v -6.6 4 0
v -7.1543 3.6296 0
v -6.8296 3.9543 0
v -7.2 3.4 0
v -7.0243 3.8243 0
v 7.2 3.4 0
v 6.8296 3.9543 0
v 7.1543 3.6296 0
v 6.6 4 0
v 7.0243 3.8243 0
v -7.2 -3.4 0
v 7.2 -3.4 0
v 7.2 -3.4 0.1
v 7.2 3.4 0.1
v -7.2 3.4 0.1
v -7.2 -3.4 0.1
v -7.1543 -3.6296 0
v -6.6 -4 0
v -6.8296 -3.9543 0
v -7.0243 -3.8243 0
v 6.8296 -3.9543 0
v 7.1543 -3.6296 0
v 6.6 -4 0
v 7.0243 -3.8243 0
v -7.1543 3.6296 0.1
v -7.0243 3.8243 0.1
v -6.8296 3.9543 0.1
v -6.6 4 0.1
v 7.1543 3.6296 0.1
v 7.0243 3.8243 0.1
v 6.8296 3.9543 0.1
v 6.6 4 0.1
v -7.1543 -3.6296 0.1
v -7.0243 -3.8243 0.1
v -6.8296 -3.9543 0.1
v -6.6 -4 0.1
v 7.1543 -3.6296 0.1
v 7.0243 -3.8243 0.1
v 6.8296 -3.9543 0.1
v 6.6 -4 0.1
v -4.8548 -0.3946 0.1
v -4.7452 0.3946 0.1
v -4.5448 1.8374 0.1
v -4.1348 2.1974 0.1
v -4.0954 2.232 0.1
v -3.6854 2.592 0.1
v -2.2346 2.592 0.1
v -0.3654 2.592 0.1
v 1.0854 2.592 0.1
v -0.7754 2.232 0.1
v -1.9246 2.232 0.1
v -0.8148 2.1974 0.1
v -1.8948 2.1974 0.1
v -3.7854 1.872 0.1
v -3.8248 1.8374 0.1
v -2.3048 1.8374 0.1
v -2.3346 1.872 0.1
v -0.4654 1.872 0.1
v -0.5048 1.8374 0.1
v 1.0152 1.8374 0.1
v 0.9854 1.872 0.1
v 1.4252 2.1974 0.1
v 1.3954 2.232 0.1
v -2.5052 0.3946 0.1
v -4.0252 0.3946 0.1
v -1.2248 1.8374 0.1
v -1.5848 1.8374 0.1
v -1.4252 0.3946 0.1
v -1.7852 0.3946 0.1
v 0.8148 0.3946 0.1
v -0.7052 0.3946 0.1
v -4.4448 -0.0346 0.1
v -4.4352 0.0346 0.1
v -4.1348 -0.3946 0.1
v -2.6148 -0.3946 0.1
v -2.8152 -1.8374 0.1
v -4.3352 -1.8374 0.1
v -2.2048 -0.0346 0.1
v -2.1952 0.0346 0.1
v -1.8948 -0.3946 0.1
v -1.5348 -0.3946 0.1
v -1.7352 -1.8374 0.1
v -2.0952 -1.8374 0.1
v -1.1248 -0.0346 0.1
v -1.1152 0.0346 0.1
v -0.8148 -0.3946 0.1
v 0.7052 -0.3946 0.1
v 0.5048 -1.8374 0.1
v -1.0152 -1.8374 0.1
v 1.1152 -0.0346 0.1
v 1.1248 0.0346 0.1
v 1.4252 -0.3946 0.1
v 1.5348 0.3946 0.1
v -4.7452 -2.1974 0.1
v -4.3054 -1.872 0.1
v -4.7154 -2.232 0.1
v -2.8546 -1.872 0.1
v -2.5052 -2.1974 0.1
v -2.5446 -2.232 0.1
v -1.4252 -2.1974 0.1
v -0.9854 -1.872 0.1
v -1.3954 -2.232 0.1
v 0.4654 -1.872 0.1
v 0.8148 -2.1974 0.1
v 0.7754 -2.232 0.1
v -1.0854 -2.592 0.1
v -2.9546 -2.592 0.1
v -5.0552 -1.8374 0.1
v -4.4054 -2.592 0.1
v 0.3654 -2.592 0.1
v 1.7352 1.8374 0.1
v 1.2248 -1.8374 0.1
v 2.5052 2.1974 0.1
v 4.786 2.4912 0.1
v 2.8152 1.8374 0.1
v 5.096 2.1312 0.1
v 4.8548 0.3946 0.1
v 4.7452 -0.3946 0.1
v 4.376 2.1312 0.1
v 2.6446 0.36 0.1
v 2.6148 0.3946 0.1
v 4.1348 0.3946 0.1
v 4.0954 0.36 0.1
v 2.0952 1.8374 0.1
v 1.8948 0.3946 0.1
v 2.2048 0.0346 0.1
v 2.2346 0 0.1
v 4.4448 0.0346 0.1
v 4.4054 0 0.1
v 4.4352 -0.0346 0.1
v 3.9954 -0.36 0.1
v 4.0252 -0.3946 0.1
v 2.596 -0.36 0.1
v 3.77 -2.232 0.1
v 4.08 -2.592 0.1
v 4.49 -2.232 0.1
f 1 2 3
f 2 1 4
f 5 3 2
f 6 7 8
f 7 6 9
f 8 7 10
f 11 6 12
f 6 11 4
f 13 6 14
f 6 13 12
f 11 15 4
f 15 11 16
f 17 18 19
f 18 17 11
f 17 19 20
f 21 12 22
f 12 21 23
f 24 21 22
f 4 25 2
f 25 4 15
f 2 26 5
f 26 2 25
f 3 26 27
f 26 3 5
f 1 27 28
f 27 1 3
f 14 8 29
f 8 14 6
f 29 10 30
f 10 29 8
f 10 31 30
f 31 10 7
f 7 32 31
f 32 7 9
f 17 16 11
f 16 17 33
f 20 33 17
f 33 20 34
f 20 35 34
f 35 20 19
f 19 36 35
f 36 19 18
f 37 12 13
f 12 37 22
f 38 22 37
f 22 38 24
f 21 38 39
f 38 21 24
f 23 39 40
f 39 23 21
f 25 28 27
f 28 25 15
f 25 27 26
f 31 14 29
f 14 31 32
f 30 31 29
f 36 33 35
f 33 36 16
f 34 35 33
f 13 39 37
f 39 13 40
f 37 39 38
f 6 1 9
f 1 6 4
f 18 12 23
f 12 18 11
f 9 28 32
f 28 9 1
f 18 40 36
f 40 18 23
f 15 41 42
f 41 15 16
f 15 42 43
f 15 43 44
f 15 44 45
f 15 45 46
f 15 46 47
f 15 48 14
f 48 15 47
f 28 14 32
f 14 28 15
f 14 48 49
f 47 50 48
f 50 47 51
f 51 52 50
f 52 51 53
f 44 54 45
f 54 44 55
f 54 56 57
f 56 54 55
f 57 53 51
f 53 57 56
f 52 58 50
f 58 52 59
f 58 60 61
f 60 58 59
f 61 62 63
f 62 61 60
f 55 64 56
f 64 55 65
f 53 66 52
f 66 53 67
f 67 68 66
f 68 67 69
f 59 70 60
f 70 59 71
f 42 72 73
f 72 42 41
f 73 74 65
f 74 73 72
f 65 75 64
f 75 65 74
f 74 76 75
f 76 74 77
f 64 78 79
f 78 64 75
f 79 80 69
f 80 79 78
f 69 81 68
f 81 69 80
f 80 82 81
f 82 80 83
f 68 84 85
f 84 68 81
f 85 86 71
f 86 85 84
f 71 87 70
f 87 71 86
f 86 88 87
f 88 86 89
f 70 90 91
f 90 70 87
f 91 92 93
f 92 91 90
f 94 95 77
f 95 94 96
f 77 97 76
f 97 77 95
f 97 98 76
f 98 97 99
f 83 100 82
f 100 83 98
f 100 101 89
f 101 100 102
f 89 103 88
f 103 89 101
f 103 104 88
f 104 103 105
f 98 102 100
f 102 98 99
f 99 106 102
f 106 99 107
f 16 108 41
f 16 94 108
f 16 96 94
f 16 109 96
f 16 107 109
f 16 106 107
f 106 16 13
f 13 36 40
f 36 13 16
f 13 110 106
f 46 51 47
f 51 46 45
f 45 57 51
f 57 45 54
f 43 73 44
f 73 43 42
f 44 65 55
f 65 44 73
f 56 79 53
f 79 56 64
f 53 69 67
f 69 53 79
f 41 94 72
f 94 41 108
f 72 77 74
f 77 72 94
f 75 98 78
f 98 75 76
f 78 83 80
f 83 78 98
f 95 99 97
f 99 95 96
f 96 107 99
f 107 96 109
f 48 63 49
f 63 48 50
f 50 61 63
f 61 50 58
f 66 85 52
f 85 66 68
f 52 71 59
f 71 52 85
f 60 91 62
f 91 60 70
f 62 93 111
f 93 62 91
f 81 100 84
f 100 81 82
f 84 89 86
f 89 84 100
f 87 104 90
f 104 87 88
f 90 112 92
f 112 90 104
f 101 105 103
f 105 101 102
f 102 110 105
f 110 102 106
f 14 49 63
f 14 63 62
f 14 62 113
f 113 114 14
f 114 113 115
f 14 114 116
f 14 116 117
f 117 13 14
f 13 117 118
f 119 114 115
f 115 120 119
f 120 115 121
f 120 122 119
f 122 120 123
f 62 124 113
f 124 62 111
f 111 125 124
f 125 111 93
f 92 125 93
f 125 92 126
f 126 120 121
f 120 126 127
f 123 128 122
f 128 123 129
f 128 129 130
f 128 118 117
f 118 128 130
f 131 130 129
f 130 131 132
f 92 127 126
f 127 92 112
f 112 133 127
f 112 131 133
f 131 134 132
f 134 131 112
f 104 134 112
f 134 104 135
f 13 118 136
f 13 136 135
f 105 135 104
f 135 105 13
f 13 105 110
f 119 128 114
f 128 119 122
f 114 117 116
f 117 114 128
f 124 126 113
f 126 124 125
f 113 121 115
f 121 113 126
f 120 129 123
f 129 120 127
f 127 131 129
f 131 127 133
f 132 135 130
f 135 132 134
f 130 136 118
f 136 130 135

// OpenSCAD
// file: ../p/box3u12.scad
use <../lib.scad>
function ldraw_lib__box3u12() = [
// 0 Box with 3 Parallel Faces without Any Edges
// 0 Name: box3u12.dat
// 0 Author: J.C. Tchang [tchang]
// 0 !LDRAW_ORG Primitive UPDATE 2014-02
// 0 !LICENSE Licensed under CC BY 4.0 : see CAreadme.txt
// 
// 0 BFC CERTIFY CCW
  [0,"BFC","CERTIFY"],
  [0,"BFC","CCW"],
// 
// 0 !HISTORY 2014-12-23 [PTadmin] Official Update 2014-02
// 
// 
// 4 16 -1 1 1 1 1 1 1 1 -1 -1 1 -1
  [4,16,-1,1,1,1,1,1,1,1,-1,-1,1,-1],
// 4 16 -1 1 1 -1 0 1 1 0 1 1 1 1
  [4,16,-1,1,1,-1,0,1,1,0,1,1,1,1],
// 4 16 1 1 -1 1 0 -1 -1 0 -1 -1 1 -1
  [4,16,1,1,-1,1,0,-1,-1,0,-1,-1,1,-1],
];
module ldraw_lib__box3u12(step=0, col=false, unit=2/5, alt=false, line=0.2, solid=!$preview)
    makepoly(ldraw_lib__box3u12(), step=step, col=col, unit=unit, alt=alt, line=line, solid=solid);
ldraw_lib__box3u12(line=0.2);
// file: ../p/1-4cyli.scad
use <../lib.scad>
function ldraw_lib__1_4cyli() = [
// 0 Cylinder 0.25
// 0 Name: 1-4cyli.dat
// 0 Author: James Jessiman
// 0 !LDRAW_ORG Primitive UPDATE 2012-01
// 0 !LICENSE Licensed under CC BY 4.0 : see CAreadme.txt
// 
// 0 BFC CERTIFY CCW
  [0,"BFC","CERTIFY"],
  [0,"BFC","CCW"],
// 
// 0 !HISTORY 2002-03-23 [sbliss] Added BFC statement.
// 0 !HISTORY 2002-04-25 [PTadmin] Official Update 2002-02
// 0 !HISTORY 2007-06-22 [PTadmin] Header formatted for Contributor Agreement
// 0 !HISTORY 2008-07-01 [PTadmin] Official Update 2008-01
// 0 !HISTORY 2012-02-16 [Philo] Changed to CCW
// 0 !HISTORY 2012-03-30 [PTadmin] Official Update 2012-01
// 
// 
// 4 16 1 1 0 0.9239 1 0.3827 0.9239 0 0.3827 1 0 0
  [4,16,1,1,0,0.9239,1,0.3827,0.9239,0,0.3827,1,0,0],
// 5 24 1 0 0 1 1 0 0.9239 0 0.3827 1 0 -1
  [5,24,1,0,0,1,1,0,0.9239,0,0.3827,1,0,-1],
// 4 16 0.9239 1 0.3827 0.7071 1 0.7071 0.7071 0 0.7071 0.9239 0 0.3827
  [4,16,0.9239,1,0.3827,0.7071,1,0.7071,0.7071,0,0.7071,0.9239,0,0.3827],
// 5 24 0.9239 0 0.3827 0.9239 1 0.3827 0.7071 0 0.7071 1 0 0
  [5,24,0.9239,0,0.3827,0.9239,1,0.3827,0.7071,0,0.7071,1,0,0],
// 4 16 0.7071 1 0.7071 0.3827 1 0.9239 0.3827 0 0.9239 0.7071 0 0.7071
  [4,16,0.7071,1,0.7071,0.3827,1,0.9239,0.3827,0,0.9239,0.7071,0,0.7071],
// 5 24 0.7071 0 0.7071 0.7071 1 0.7071 0.3827 0 0.9239 0.9239 0 0.3827
  [5,24,0.7071,0,0.7071,0.7071,1,0.7071,0.3827,0,0.9239,0.9239,0,0.3827],
// 4 16 0.3827 1 0.9239 0 1 1 0 0 1 0.3827 0 0.9239
  [4,16,0.3827,1,0.9239,0,1,1,0,0,1,0.3827,0,0.9239],
// 5 24 0.3827 0 0.9239 0.3827 1 0.9239 0 0 1 0.7071 0 0.7071
  [5,24,0.3827,0,0.9239,0.3827,1,0.9239,0,0,1,0.7071,0,0.7071],
// 5 24 0 0 1 0 1 1 0.3827 0 0.9239 -1 0 1
  [5,24,0,0,1,0,1,1,0.3827,0,0.9239,-1,0,1],
];
module ldraw_lib__1_4cyli(step=0, col=false, unit=2/5, alt=false, line=0.2, solid=!$preview)
    makepoly(ldraw_lib__1_4cyli(), step=step, col=col, unit=unit, alt=alt, line=line, solid=solid);
ldraw_lib__1_4cyli(line=0.2);
// file: ../p/1-4chrd.scad
use <../lib.scad>
function ldraw_lib__1_4chrd() = [
// 0 Chord 0.25
// 0 Name: 1-4chrd.dat
// 0 Author: Max Martin Richter [MMR1988]
// 0 !LDRAW_ORG Primitive UPDATE 2023-05
// 0 !LICENSE Licensed under CC BY 4.0 : see CAreadme.txt
// 
// 0 BFC CERTIFY CCW
  [0,"BFC","CERTIFY"],
  [0,"BFC","CCW"],
// 
// 0 !HISTORY 2004-04-22 [PTadmin] Official Update 2004-02
// 0 !HISTORY 2007-10-09 [PTadmin] Header formatted for Contributor Agreement
// 0 !HISTORY 2008-07-01 [PTadmin] Official Update 2008-01
// 0 !HISTORY 2012-08-02 [MMR1988] Re-creation with PrimGen2 and Rectifier
// 0 !HISTORY 2012-08-09 [PTadmin] Official Update 2012-02
// 0 !HISTORY 2023-10-27 [OrionP] Change author to MMR1988 from hafhead
// 0 !HISTORY 2023-10-31 [OrionP] Official Update 2023-05
// 
// 4 16 0.9239 0 0.3827 0.3827 0 0.9239 0 0 1 1 0 0
  [4,16,0.9239,0,0.3827,0.3827,0,0.9239,0,0,1,1,0,0],
// 3 16 0.7071 0 0.7071 0.3827 0 0.9239 0.9239 0 0.3827
  [3,16,0.7071,0,0.7071,0.3827,0,0.9239,0.9239,0,0.3827],
];
module ldraw_lib__1_4chrd(step=0, col=false, unit=2/5, alt=false, line=0.2, solid=!$preview)
    makepoly(ldraw_lib__1_4chrd(), step=step, col=col, unit=unit, alt=alt, line=line, solid=solid);
ldraw_lib__1_4chrd(line=0.2);
// main file
use <../lib.scad>
use <s/6221655aks01.scad>
function ldraw_lib__6221655an() = [
// 0 Sticker  1.0 x  1.8 with Yellow Digital "4" on Black Background
// 0 Name: 6221655an.dat
// 0 Author: Massimo Maso [Sirio]
// 0 !LDRAW_ORG Part UPDATE 2024-09
// 0 !LICENSE Licensed under CC BY 4.0 : see CAreadme.txt
// 
// 0 BFC CERTIFY CCW
  [0,"BFC","CERTIFY"],
  [0,"BFC","CCW"],
// 
// 0 !KEYWORDS 3.0, 911 RSR, Set 75888, Speed Champions, Turbo
// 
// 0 !HISTORY 2024-10-27 [OrionP] Official Update 2024-09
// 
// 0 // Subpart
// 1 16 0 0 0 1 0 0 0 1 0 0 0 1 s\6221655aks01.dat
  [1,16,0,0,0,1,0,0,0,1,0,0,0,1, ldraw_lib__s__6221655aks01()],
// 0 // Top face
// 0 // Black faces
// 3 0 18 -.25 8.5 2.7136 -.25 6.48 3.4886 -.25 5.58
  [3,0,18,-.25,8.5,2.7136,-.25,6.48,3.4886,-.25,5.58],
// 3 0 18 -.25 8.5 3.4886 -.25 5.58 3.563 -.25 5.4936
  [3,0,18,-.25,8.5,3.4886,-.25,5.58,3.563,-.25,5.4936],
// 3 0 18 -.25 8.5 3.563 -.25 5.4936 6.263 -.25 5.4936
  [3,0,18,-.25,8.5,3.563,-.25,5.4936,6.263,-.25,5.4936],
// 4 0 18 -.25 8.5 6.263 -.25 5.4936 7.038 -.25 4.5936 11.965 -.25 6.228
  [4,0,18,-.25,8.5,6.263,-.25,5.4936,7.038,-.25,4.5936,11.965,-.25,6.228],
// 3 0 18 -.25 8.5 11.965 -.25 6.228 12.74 -.25 5.328
  [3,0,18,-.25,8.5,11.965,-.25,6.228,12.74,-.25,5.328],
// 3 0 18 -.25 8.5 12.74 -.25 5.328 12.137 -.25 .9864
  [3,0,18,-.25,8.5,12.74,-.25,5.328,12.137,-.25,.9864],
// 4 0 18 -.25 8.5 12.137 -.25 .9864 11.863 -.25 -.9864 18 -.25 -8.5
  [4,0,18,-.25,8.5,12.137,-.25,.9864,11.863,-.25,-.9864,18,-.25,-8.5],
// 3 0 10.94 -.25 5.328 11.965 -.25 6.228 7.038 -.25 4.5936
  [3,0,10.94,-.25,5.328,11.965,-.25,6.228,7.038,-.25,4.5936],
// 4 0 10.94 -.25 5.328 7.038 -.25 4.5936 6.537 -.25 .9864 6.6114 -.25 .9
  [4,0,10.94,-.25,5.328,7.038,-.25,4.5936,6.537,-.25,.9864,6.6114,-.25,.9],
// 4 0 10.94 -.25 5.328 6.6114 -.25 .9 10.2386 -.25 .9 10.337 -.25 .9864
  [4,0,10.94,-.25,5.328,6.6114,-.25,.9,10.2386,-.25,.9,10.337,-.25,.9864],
// 4 0 4.338 -.25 4.5936 5.238 -.25 4.5936 6.263 -.25 5.4936 3.563 -.25 5.4936
  [4,0,4.338,-.25,4.5936,5.238,-.25,4.5936,6.263,-.25,5.4936,3.563,-.25,5.4936],
// 4 0 4.338 -.25 4.5936 3.837 -.25 .9864 4.737 -.25 .9864 5.238 -.25 4.5936
  [4,0,4.338,-.25,4.5936,3.837,-.25,.9864,4.737,-.25,.9864,5.238,-.25,4.5936],
// 4 0 5.512 -.25 .0864 4.737 -.25 .9864 3.837 -.25 .9864 3.563 -.25 -.9864
  [4,0,5.512,-.25,.0864,4.737,-.25,.9864,3.837,-.25,.9864,3.563,-.25,-.9864],
// 4 0 5.512 -.25 .0864 5.5864 -.25 0 6.6114 -.25 .9 6.537 -.25 .9864
  [4,0,5.512,-.25,.0864,5.5864,-.25,0,6.6114,-.25,.9,6.537,-.25,.9864],
// 4 0 11.112 -.25 .0864 10.337 -.25 .9864 10.2386 -.25 .9 11.0136 -.25 0
  [4,0,11.112,-.25,.0864,10.337,-.25,.9864,10.2386,-.25,.9,11.0136,-.25,0],
// 3 0 11.112 -.25 .0864 11.0136 -.25 0 11.088 -.25 -.0864
  [3,0,11.112,-.25,.0864,11.0136,-.25,0,11.088,-.25,-.0864],
// 4 0 11.112 -.25 .0864 11.088 -.25 -.0864 11.863 -.25 -.9864 12.137 -.25 .9864
  [4,0,11.112,-.25,.0864,11.088,-.25,-.0864,11.863,-.25,-.9864,12.137,-.25,.9864],
// 4 0 11.088 -.25 -.0864 11.0136 -.25 0 9.9886 -.25 -.9 10.063 -.25 -.9864
  [4,0,11.088,-.25,-.0864,11.0136,-.25,0,9.9886,-.25,-.9,10.063,-.25,-.9864],
// 4 0 3.062 -.25 -4.5936 5.5864 -.25 0 5.512 -.25 .0864 3.563 -.25 -.9864
  [4,0,3.062,-.25,-4.5936,5.5864,-.25,0,5.512,-.25,.0864,3.563,-.25,-.9864],
// 3 0 3.062 -.25 -4.5936 6.49 -.25 -.9 5.5864 -.25 0
  [3,0,3.062,-.25,-4.5936,6.49,-.25,-.9,5.5864,-.25,0],
// 3 0 3.062 -.25 -4.5936 9.9886 -.25 -.9 6.49 -.25 -.9
  [3,0,3.062,-.25,-4.5936,9.9886,-.25,-.9,6.49,-.25,-.9],
// 4 0 3.062 -.25 -4.5936 9.425 -.25 -5.58 10.063 -.25 -.9864 9.9886 -.25 -.9
  [4,0,3.062,-.25,-4.5936,9.425,-.25,-5.58,10.063,-.25,-.9864,9.9886,-.25,-.9],
// 4 0 3.062 -.25 -4.5936 2.037 -.25 -5.4936 10.2 -.25 -6.48 9.425 -.25 -5.58
  [4,0,3.062,-.25,-4.5936,2.037,-.25,-5.4936,10.2,-.25,-6.48,9.425,-.25,-5.58],
// 3 0 18 -.25 -8.5 11.863 -.25 -.9864 11.225 -.25 -5.58
  [3,0,18,-.25,-8.5,11.863,-.25,-.9864,11.225,-.25,-5.58],
// 3 0 18 -.25 -8.5 11.225 -.25 -5.58 10.2 -.25 -6.48
  [3,0,18,-.25,-8.5,11.225,-.25,-5.58,10.2,-.25,-6.48],
// 4 0 18 -.25 -8.5 10.2 -.25 -6.48 2.037 -.25 -5.4936 1.9386 -.25 -5.58
  [4,0,18,-.25,-8.5,10.2,-.25,-6.48,2.037,-.25,-5.4936,1.9386,-.25,-5.58],
// 3 0 18 -.25 -8.5 1.9386 -.25 -5.58 .9136 -.25 -6.48
  [3,0,18,-.25,-8.5,1.9386,-.25,-5.58,.9136,-.25,-6.48],
// 0 // Yellow number
// 4 14 11.965 -.25 6.228 10.94 -.25 5.328 10.337 -.25 .9864 11.112 -.25 .0864
  [4,14,11.965,-.25,6.228,10.94,-.25,5.328,10.337,-.25,.9864,11.112,-.25,.0864],
// 4 14 11.965 -.25 6.228 11.112 -.25 .0864 12.137 -.25 .9864 12.74 -.25 5.328
  [4,14,11.965,-.25,6.228,11.112,-.25,.0864,12.137,-.25,.9864,12.74,-.25,5.328],
// 4 14 6.263 -.25 5.4936 5.238 -.25 4.5936 4.737 -.25 .9864 5.512 -.25 .0864
  [4,14,6.263,-.25,5.4936,5.238,-.25,4.5936,4.737,-.25,.9864,5.512,-.25,.0864],
// 4 14 6.263 -.25 5.4936 5.512 -.25 .0864 6.537 -.25 .9864 7.038 -.25 4.5936
  [4,14,6.263,-.25,5.4936,5.512,-.25,.0864,6.537,-.25,.9864,7.038,-.25,4.5936],
// 4 14 5.5864 -.25 0 11.0136 -.25 0 10.2386 -.25 .9 6.6114 -.25 .9
  [4,14,5.5864,-.25,0,11.0136,-.25,0,10.2386,-.25,.9,6.6114,-.25,.9],
// 4 14 5.5864 -.25 0 6.49 -.25 -.9 9.9886 -.25 -.9 11.0136 -.25 0
  [4,14,5.5864,-.25,0,6.49,-.25,-.9,9.9886,-.25,-.9,11.0136,-.25,0],
// 4 14 11.088 -.25 -.0864 10.063 -.25 -.9864 9.425 -.25 -5.58 10.2 -.25 -6.48
  [4,14,11.088,-.25,-.0864,10.063,-.25,-.9864,9.425,-.25,-5.58,10.2,-.25,-6.48],
// 4 14 11.088 -.25 -.0864 10.2 -.25 -6.48 11.225 -.25 -5.58 11.863 -.25 -.9864
  [4,14,11.088,-.25,-.0864,10.2,-.25,-6.48,11.225,-.25,-5.58,11.863,-.25,-.9864],
];
module ldraw_lib__6221655an(step=0, col=false, unit=2/5, alt=false, line=0.2, solid=!$preview)
    makepoly(ldraw_lib__6221655an(), step=step, col=col, unit=unit, alt=alt, line=line, solid=solid);
ldraw_lib__6221655an(line=0.2);
